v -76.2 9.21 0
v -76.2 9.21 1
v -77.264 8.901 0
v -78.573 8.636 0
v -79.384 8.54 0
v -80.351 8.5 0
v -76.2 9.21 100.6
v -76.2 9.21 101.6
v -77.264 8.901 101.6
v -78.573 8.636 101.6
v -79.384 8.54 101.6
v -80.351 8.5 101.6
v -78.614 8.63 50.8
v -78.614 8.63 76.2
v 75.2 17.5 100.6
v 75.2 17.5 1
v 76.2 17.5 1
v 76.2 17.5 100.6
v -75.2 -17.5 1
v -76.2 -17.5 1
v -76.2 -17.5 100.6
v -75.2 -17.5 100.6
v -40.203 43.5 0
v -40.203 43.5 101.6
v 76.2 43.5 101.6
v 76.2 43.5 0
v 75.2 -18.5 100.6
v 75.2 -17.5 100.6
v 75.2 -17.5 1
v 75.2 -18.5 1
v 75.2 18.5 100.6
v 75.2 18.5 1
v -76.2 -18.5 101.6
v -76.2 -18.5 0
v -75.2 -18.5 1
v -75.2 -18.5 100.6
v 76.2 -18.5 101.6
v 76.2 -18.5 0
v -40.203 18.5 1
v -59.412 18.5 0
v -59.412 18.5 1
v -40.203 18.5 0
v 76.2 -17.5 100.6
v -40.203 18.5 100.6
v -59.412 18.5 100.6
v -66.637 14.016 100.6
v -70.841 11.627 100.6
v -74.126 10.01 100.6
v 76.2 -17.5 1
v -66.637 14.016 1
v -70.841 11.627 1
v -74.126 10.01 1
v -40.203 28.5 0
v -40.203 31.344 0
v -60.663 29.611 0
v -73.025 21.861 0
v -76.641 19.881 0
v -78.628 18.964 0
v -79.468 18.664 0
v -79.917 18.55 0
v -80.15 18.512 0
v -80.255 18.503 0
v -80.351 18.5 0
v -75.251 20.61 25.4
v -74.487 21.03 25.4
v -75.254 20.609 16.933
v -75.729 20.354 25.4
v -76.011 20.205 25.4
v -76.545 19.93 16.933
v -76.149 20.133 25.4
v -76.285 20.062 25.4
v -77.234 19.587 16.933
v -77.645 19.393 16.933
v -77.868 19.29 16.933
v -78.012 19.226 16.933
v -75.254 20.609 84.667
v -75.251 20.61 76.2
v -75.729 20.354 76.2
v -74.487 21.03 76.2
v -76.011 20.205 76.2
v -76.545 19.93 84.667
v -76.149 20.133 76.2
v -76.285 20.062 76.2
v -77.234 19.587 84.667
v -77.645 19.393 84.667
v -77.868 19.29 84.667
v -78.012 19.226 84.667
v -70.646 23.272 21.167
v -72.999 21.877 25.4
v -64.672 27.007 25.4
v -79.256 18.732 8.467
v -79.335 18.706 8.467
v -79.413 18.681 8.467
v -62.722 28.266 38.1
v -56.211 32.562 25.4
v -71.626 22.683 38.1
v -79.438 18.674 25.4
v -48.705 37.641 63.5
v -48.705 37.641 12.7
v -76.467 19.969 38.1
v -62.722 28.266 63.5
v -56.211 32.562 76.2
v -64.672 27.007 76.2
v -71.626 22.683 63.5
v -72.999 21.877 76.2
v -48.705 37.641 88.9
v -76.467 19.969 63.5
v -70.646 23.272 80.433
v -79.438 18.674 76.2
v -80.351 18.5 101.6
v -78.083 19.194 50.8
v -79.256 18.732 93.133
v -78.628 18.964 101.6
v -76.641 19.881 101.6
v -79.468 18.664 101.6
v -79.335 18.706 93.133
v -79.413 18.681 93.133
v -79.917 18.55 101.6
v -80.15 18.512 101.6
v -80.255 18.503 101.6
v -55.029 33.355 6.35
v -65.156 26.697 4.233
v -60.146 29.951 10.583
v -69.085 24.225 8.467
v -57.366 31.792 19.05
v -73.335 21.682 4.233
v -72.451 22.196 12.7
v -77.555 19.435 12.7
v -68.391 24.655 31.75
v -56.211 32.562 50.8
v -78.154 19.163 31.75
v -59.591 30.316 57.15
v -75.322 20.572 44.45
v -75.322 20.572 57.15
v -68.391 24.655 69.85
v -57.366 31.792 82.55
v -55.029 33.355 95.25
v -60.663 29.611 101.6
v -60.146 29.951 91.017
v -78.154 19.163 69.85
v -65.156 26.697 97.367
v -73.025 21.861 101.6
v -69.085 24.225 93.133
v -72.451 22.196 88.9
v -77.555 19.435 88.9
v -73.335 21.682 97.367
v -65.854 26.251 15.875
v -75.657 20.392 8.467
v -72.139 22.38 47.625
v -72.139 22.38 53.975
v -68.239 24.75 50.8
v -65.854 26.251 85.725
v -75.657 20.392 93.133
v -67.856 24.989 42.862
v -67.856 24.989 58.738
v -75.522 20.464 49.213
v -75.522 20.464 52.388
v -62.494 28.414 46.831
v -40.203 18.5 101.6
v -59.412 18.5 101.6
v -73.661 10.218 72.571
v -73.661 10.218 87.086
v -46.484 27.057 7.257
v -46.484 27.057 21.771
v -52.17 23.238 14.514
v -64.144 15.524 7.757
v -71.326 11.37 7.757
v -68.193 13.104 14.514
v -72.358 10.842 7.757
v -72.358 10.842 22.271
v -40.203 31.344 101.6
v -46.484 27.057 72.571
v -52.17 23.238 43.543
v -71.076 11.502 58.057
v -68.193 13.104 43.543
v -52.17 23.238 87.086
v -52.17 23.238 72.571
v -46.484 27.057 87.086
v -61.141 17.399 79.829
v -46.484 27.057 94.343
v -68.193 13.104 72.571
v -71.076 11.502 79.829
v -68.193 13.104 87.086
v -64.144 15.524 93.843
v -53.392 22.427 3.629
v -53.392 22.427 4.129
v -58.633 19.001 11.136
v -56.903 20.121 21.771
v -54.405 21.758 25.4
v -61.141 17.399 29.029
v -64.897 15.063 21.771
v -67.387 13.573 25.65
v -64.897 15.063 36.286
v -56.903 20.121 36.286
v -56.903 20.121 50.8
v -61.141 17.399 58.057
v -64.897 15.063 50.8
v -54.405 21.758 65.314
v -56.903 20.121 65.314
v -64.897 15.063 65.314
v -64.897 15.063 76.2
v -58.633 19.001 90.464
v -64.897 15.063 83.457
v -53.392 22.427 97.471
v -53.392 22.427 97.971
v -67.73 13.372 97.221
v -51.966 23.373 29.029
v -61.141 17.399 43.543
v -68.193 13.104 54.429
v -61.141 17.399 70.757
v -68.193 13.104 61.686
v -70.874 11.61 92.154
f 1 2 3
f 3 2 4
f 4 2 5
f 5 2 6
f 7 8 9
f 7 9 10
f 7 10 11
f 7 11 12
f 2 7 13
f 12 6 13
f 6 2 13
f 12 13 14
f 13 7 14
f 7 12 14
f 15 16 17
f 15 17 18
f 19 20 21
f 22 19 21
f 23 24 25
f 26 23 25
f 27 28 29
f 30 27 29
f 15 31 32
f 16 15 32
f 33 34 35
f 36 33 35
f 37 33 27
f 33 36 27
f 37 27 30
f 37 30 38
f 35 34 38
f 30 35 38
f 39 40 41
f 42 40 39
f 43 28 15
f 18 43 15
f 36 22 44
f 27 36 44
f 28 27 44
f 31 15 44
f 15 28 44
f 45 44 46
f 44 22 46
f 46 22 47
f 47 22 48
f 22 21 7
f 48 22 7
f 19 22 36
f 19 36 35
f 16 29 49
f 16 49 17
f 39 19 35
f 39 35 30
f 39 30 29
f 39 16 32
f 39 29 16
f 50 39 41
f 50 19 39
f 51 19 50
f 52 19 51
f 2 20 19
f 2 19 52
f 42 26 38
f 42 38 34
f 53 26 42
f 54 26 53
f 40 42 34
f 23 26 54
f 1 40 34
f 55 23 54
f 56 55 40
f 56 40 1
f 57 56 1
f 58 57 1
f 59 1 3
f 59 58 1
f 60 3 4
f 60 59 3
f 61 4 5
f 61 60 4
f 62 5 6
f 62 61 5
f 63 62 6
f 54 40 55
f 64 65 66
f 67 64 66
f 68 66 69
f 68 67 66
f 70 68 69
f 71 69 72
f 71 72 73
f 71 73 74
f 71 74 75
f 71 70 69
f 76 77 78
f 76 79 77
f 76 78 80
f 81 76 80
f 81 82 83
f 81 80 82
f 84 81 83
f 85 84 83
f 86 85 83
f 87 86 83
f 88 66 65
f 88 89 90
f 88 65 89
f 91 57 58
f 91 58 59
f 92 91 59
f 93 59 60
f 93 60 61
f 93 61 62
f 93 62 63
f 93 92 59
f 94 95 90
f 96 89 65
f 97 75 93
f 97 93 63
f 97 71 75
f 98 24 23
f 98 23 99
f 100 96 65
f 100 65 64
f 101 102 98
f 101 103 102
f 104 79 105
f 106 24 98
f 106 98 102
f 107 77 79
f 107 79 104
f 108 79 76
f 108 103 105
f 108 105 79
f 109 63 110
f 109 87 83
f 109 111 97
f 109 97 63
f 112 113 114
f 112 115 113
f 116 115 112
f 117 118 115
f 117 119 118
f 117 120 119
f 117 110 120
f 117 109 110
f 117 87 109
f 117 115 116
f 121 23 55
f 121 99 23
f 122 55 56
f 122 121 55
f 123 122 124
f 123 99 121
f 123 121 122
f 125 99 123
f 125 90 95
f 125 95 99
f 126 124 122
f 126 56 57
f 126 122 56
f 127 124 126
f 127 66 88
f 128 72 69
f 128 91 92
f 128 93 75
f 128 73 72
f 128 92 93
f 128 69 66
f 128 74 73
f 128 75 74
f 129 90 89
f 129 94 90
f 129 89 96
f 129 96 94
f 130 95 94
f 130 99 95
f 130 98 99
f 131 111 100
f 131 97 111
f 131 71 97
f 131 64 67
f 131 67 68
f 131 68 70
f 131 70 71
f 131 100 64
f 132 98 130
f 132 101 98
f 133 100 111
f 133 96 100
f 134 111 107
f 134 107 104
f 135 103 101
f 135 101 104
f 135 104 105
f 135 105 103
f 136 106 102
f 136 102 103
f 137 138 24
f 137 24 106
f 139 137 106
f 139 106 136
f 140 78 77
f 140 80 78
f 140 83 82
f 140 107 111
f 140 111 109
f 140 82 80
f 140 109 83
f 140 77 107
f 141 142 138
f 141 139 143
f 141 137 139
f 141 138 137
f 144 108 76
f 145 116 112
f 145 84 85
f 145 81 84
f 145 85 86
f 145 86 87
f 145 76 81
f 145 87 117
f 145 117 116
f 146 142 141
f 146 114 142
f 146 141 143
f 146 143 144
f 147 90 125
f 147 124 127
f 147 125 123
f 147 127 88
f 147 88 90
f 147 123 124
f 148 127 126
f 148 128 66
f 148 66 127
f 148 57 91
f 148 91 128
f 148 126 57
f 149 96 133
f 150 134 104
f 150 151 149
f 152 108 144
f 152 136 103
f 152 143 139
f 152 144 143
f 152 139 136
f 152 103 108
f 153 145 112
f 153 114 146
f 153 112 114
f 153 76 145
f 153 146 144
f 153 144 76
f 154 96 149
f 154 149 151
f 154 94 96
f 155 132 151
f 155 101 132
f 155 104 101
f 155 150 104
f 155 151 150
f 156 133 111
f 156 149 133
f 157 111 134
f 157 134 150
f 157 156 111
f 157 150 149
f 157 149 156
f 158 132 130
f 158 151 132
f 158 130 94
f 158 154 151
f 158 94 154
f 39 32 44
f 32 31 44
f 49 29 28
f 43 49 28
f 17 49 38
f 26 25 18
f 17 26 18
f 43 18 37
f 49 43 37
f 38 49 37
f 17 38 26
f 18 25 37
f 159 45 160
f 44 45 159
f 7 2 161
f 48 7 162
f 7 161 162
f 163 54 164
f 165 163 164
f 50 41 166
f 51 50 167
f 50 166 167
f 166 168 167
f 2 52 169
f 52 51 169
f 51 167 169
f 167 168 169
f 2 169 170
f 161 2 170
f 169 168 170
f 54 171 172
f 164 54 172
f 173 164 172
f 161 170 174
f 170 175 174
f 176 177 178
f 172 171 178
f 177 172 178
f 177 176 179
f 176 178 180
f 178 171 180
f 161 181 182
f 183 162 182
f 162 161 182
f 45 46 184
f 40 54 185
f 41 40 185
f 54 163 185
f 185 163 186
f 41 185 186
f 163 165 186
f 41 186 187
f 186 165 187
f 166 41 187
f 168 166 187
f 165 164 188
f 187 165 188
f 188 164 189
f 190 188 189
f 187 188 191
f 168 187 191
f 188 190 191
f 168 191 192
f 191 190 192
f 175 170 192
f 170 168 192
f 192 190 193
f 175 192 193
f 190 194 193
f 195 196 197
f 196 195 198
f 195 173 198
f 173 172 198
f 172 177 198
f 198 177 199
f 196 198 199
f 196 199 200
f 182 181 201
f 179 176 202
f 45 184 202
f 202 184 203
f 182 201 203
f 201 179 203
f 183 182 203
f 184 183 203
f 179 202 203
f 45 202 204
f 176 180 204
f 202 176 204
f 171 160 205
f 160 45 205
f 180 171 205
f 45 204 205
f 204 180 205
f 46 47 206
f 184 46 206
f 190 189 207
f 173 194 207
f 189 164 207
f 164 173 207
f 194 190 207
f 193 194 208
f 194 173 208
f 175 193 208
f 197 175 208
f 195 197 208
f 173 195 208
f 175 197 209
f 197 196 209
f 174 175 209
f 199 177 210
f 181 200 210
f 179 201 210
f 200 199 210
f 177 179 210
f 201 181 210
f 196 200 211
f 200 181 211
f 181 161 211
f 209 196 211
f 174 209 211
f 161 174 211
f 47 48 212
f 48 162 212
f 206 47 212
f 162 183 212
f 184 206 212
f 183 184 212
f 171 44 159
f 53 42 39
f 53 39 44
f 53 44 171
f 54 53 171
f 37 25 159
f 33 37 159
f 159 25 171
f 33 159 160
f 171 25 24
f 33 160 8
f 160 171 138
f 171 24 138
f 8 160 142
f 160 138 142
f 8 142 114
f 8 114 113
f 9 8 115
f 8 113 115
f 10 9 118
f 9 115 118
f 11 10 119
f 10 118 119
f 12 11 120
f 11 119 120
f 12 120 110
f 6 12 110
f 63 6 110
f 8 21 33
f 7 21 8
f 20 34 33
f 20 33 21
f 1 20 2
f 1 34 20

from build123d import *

# Parameters (mm, degrees)
SKETCH1_W           = 152.4
SKETCH1_H           = 37
BOSS_EXTRUDE1_DEPTH = 101.6
SKETCH2_W           = 99.6
SKETCH2_H           = 35
CUT_EXTRUDE1_DEPTH  = 185.093916249
SKETCH3_W           = 150.4
SKETCH3_H           = 99.6
CUT_EXTRUDE2_DEPTH  = 133.280006048
EXTRUDE_THIN4_START = -101.6
EXTRUDE_THIN4_DEPTH = 101.6
SKETCH9_W           = 106.403135183
SKETCH9_H           = 5
BOSS_EXTRUDE4_DEPTH = 101.6


# Read off the part's stored shape, not the designer's step: Extrude-Thin4
with BuildPart() as part:
    # Sketch1 → Boss-Extrude1 (new body)
    with BuildSketch(Plane.XY):
        Rectangle(SKETCH1_W, SKETCH1_H)
    extrude(amount=BOSS_EXTRUDE1_DEPTH)

    # Sketch2 → Cut-Extrude1 (cut, through all)
    with BuildSketch(Plane.ZY.offset(76.2)):
        with Locations((50.8, 0)):
            Rectangle(SKETCH2_W, SKETCH2_H)
    extrude(amount=-CUT_EXTRUDE1_DEPTH, mode=Mode.SUBTRACT)

    # Sketch3 → Cut-Extrude2 (cut, through all)
    with BuildSketch(Plane(origin=(0, 18.5, 0), x_dir=(1, 0, 0), z_dir=(0, 1, 0))):
        with Locations((0, -50.8)):
            Rectangle(SKETCH3_W, SKETCH3_H)
    extrude(amount=-CUT_EXTRUDE2_DEPTH, mode=Mode.SUBTRACT)

    # Extrude-Thin4 outline → Extrude-Thin4 (add)
    with BuildSketch(Plane(origin=(0, 0, 0), x_dir=(-1, 0, 0), z_dir=(0, 0, -1)).offset(EXTRUDE_THIN4_START)):
        with BuildLine():
            Line((-76.2, 43.5), (-76.2, 18.5))
            Line((-76.2, 18.5), (40.203135183, 18.5))
            Line((40.203135183, 18.5), (40.203135183, 28.5))
            Line((40.203135183, 28.5), (-66.2, 28.5))
            Line((-66.2, 28.5), (-66.2, 33.5))
            Line((-66.2, 33.5), (37.076687279, 33.5))
            add(Edge.make_bspline(
                [(37.076687279, 33.5), (42.712503235, 29.602755941), (47.740101517, 26.184011055), (56.600294641, 20.291071098), (60.430190038, 17.818058565), (65.330997145, 14.789830611), (66.824161054, 13.89378122), (69.560877297, 12.31480535), (70.801570346, 11.632483882), (72.54251455, 10.745567395), (73.103276521, 10.472479574), (74.21882377, 9.963704392), (74.771996239, 9.727837773), (75.629792754, 9.404385606), (75.906990567, 9.305691485), (76.2, 9.210010654)],
                knots=[0, 0, 0, 0, 0.25, 0.25, 0.5, 0.5, 0.625, 0.625, 0.75, 0.75, 0.8125, 0.8125, 0.875, 0.875, 0.903624295, 0.903624295, 0.903624295, 0.903624295], degree=3))
            add(Edge.make_bspline(
                [(76.2, 9.210010654), (76.22687774, 9.201233856), (76.253888525, 9.192482414), (76.604166758, 9.079903255), (76.946677128, 8.979439764), (77.707610171, 8.79063089), (78.125422966, 8.701549246), (79.103306411, 8.557457163), (79.663066468, 8.499997568), (80.351085446, 8.499997395)],
                knots=[0.903624295, 0.903624295, 0.903624295, 0.903624295, 0.90625, 0.90625, 0.9375, 0.9375, 0.96875, 0.96875, 1, 1, 1, 1], degree=3))
            Line((80.351085446, 8.499997395), (80.351087966, 18.499997395))
            add(Edge.make_bspline(
                [(40.203135183, 43.5), (76.200002245, 18.499998441), (80.351087966, 18.499997395)],
                knots=[0, 0, 0, 1, 1, 1], degree=2))
            Line((40.203135183, 43.5), (-76.2, 43.5))
        make_face()
    extrude(amount=EXTRUDE_THIN4_DEPTH)

    # Sketch9 → Boss-Extrude4 (add)
    with BuildSketch(Plane(origin=(0, 0, 0), x_dir=(-1, 0, 0), z_dir=(0, 0, -1))):
        with Locations((-12.998432409, 31)):
            Rectangle(SKETCH9_W, SKETCH9_H)
    extrude(amount=-BOSS_EXTRUDE4_DEPTH)


solid = part.part
